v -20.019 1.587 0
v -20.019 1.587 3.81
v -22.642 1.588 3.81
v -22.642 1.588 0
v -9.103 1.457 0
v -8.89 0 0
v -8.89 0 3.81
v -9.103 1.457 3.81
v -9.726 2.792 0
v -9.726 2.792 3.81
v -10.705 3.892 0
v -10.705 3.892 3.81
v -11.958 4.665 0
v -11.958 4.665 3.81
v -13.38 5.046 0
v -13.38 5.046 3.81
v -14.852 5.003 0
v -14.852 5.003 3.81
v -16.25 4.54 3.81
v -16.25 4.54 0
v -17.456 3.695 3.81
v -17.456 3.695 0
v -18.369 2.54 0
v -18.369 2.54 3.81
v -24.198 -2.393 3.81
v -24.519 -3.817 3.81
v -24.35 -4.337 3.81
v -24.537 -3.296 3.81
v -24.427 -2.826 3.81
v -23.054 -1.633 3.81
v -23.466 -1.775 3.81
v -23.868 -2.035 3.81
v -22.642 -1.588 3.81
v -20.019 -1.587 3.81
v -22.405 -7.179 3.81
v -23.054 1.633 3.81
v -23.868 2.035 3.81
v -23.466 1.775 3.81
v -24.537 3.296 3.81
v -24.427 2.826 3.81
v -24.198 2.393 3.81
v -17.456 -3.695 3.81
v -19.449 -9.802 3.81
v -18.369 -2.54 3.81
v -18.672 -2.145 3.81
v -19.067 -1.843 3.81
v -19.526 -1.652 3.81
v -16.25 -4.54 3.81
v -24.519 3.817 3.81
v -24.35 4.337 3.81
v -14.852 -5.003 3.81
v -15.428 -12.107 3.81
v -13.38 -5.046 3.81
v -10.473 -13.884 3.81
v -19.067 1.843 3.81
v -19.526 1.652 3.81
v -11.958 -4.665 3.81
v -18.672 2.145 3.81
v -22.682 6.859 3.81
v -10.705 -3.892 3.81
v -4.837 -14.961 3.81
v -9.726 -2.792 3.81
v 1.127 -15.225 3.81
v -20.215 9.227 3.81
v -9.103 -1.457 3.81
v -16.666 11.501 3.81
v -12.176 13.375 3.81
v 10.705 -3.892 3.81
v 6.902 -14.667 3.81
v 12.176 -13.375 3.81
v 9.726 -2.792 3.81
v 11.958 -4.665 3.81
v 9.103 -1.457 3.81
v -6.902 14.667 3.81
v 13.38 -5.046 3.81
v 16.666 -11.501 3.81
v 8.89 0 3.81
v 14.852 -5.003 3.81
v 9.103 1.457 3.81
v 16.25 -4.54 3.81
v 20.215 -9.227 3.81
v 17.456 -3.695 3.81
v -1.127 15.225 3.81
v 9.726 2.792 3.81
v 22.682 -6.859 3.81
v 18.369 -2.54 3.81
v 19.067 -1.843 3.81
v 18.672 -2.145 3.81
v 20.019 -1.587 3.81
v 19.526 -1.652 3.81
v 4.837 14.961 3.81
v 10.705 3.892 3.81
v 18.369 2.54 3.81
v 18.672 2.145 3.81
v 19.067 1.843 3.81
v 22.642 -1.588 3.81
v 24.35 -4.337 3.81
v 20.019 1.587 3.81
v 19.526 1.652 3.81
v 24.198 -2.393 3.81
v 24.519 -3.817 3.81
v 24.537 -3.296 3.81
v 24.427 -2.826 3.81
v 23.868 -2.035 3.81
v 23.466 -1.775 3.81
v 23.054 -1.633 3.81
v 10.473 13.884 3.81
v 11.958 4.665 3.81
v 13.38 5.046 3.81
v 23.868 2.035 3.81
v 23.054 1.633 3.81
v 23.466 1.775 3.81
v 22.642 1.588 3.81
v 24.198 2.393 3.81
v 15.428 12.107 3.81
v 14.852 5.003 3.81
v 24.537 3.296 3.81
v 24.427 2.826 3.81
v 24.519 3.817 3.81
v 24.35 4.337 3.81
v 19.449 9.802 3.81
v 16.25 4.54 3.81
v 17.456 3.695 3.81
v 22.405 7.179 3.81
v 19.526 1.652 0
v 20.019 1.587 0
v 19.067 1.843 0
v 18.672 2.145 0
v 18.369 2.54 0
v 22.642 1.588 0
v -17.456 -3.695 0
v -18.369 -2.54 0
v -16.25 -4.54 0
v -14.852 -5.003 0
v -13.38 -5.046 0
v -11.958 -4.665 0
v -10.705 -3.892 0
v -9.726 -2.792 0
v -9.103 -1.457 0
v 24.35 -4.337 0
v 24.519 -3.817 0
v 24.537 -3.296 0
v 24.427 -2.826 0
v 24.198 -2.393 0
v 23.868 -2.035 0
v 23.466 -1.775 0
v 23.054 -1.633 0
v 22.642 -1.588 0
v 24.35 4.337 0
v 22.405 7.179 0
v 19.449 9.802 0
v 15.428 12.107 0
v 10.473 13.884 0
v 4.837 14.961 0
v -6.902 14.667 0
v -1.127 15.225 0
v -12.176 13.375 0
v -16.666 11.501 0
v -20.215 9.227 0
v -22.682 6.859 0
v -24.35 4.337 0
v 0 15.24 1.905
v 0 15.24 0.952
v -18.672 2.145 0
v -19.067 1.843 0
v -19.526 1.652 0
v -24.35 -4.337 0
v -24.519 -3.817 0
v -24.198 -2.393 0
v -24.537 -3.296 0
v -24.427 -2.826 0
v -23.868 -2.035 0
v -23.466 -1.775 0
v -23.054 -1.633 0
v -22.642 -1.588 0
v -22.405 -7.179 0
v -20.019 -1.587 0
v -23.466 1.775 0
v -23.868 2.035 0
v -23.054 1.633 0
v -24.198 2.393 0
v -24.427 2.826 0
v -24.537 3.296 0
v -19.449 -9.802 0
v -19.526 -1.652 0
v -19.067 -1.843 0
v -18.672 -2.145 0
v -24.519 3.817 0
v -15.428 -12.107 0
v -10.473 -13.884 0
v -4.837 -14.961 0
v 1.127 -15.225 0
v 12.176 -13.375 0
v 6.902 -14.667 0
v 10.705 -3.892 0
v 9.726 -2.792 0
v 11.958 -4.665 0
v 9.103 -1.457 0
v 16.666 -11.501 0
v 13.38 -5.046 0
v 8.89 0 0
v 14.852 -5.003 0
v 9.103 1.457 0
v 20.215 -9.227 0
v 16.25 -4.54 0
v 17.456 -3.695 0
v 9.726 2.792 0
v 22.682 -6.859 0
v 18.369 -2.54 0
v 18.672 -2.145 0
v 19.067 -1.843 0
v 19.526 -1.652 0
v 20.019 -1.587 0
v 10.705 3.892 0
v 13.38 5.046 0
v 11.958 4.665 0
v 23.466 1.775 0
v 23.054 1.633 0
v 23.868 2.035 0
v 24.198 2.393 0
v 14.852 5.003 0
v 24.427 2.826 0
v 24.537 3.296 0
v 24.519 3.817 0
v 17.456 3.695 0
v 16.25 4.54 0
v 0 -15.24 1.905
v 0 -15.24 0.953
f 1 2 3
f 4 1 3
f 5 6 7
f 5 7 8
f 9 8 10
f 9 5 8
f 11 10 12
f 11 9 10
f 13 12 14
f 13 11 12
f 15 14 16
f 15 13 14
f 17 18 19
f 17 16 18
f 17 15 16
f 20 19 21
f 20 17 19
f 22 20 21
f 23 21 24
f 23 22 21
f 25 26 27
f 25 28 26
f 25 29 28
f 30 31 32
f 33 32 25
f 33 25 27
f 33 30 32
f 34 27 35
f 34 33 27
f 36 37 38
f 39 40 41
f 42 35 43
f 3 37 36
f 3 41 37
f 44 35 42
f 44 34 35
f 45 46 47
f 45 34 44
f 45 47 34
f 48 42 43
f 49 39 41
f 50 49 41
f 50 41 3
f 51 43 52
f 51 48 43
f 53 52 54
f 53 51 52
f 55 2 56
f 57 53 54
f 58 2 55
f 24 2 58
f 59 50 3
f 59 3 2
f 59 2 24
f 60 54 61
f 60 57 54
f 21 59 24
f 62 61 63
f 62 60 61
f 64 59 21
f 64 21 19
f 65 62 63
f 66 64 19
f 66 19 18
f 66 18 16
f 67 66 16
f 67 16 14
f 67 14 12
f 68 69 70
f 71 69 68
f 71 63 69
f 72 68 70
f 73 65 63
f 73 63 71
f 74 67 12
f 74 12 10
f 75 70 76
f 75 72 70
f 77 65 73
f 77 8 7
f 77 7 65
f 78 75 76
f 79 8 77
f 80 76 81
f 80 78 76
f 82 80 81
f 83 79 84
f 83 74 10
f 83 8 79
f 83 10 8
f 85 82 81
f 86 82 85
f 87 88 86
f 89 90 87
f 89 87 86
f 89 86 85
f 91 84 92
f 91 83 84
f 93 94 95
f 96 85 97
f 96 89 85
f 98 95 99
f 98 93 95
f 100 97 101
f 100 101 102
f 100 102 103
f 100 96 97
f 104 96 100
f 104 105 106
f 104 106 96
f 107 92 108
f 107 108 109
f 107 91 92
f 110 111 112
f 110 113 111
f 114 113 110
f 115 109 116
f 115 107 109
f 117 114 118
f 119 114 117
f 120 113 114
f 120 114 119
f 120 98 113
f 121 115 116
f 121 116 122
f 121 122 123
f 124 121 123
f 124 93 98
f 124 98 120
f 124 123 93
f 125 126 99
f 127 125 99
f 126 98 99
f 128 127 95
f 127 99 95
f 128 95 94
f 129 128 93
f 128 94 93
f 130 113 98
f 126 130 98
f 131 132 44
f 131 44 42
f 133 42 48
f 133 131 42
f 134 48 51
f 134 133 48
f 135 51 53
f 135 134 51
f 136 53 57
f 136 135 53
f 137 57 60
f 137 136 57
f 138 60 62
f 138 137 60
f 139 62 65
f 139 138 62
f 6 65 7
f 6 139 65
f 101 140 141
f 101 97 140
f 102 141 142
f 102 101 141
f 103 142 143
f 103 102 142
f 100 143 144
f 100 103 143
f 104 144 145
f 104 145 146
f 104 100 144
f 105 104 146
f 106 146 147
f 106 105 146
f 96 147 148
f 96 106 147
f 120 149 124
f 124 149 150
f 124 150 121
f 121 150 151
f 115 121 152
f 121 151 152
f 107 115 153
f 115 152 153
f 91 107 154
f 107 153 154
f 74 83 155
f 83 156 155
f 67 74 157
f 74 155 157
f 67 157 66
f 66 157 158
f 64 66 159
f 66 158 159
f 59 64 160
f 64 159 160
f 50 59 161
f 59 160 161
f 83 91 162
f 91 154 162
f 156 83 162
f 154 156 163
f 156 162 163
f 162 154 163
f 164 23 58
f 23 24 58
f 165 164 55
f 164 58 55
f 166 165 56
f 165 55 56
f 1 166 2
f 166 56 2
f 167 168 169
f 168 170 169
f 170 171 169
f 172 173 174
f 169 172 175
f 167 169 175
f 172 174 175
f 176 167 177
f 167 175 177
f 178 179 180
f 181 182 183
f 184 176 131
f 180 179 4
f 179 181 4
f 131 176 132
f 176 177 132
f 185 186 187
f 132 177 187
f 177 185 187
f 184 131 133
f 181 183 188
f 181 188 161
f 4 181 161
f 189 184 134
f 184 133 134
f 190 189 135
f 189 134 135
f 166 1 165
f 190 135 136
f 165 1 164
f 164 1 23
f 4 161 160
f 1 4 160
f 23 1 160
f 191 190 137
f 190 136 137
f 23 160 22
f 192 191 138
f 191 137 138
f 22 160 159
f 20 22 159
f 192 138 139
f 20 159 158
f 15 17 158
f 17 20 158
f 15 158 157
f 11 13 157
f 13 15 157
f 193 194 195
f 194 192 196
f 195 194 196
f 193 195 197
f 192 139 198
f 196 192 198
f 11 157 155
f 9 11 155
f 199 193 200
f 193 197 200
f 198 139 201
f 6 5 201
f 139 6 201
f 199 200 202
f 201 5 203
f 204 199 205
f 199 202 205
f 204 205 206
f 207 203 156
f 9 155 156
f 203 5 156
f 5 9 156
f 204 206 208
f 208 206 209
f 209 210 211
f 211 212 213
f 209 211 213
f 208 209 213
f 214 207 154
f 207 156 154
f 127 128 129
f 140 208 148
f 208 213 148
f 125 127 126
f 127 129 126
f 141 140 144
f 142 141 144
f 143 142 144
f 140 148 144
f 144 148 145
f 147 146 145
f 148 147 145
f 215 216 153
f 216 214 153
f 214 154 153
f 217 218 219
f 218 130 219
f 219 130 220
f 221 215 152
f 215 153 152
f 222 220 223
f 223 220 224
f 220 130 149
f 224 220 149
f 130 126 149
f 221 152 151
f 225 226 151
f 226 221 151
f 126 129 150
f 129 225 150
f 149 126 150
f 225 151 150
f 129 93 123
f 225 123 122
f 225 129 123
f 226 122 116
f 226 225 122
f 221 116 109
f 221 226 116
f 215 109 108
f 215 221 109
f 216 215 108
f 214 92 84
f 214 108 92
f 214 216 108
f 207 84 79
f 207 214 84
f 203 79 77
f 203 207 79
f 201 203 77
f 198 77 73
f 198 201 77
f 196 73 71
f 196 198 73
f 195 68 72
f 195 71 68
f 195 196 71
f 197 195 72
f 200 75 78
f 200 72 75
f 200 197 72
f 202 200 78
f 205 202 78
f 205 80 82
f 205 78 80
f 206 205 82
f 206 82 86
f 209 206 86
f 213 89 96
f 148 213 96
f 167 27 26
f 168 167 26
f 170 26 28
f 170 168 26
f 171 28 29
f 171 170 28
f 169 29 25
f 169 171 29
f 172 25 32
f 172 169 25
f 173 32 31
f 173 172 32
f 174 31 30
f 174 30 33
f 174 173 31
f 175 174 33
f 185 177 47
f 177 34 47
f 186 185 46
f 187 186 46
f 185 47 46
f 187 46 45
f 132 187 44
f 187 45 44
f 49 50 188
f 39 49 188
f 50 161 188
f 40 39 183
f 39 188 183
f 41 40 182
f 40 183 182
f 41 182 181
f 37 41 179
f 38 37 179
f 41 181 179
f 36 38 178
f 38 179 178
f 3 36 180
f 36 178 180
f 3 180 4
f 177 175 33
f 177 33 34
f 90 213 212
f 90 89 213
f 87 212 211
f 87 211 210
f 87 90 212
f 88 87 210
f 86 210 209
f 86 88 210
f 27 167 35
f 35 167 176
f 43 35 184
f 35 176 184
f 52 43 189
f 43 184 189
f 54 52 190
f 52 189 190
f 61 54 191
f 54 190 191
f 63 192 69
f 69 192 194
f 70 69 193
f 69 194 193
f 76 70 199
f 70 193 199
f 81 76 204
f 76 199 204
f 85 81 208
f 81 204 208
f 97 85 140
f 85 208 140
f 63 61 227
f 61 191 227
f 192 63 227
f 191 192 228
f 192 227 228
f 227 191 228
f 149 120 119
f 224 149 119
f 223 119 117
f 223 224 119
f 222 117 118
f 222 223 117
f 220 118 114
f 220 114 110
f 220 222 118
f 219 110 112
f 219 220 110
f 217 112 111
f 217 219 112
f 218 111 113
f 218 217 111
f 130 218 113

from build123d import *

# Parameters (mm, degrees)
F1_DEPTH = 3.81
F3_DEPTH = 3.8110001
F4_R     = 1.905
F5_R     = 1.905


with BuildPart() as f1:
    # F0 (on Top) → F1 (new body)
    with BuildSketch(Plane.XY):
        with BuildLine():
            Line((25.4, 0), (-25.4, 0))
            add(Edge.make_bspline(
                [(-25.4, 0), (-25.4, -15.24), (0, -15.24), (25.4, -15.24), (25.4, 0)],
                knots=[0, 0, 0, 1.5707963268, 1.5707963268, 3.1415926536, 3.1415926536, 3.1415926536], degree=2, weights=[1, 0.7071067812, 1, 0.7071067812, 1]))
        make_face()
        with BuildLine():
            add(Edge.make_bspline(
                [(25.4, 0), (25.4, 15.24), (0, 15.24), (-25.4, 15.24), (-25.4, 0)],
                knots=[3.1415926536, 3.1415926536, 3.1415926536, 4.7123889804, 4.7123889804, 6.2831853072, 6.2831853072, 6.2831853072], degree=2, weights=[1, 0.7071067812, 1, 0.7071067812, 1]))
            Line((-25.4, 0), (25.4, 0))
        make_face()
    extrude(amount=F1_DEPTH)

    # F2 (on Top) → F3 (cut, through all)
    with BuildSketch(Plane.XY):
        with BuildLine():
            ThreePointArc((18.7955822188, -1.5875), (18.9859923082, -0.8038788244), (19.05, 0))
            ThreePointArc((19.05, 0), (18.9859923082, 0.8038788244), (18.7955822188, 1.5875))
            ThreePointArc((18.7955822188, 1.5875), (8.89, 0), (18.7955822188, -1.5875))
        make_face()
        with BuildLine():
            ThreePointArc((18.7955822188, 1.5875), (18.9859923082, 0.8038788244), (19.05, 0))
            ThreePointArc((19.05, 0), (18.9859923082, -0.8038788244), (18.7955822188, -1.5875))
            Line((18.7955822188, -1.5875), (25.2618203218, -1.5875))
            ThreePointArc((25.2618203218, -1.5875), (27.3468412814, -0.2786884779), (25.7413380683, 1.5875))
            Line((25.7413380683, 1.5875), (18.7955822188, 1.5875))
        make_face()
        with BuildLine():
            ThreePointArc((-18.7955822188, -1.5875), (-13.1661211756, -5.0159923082), (-8.89, 0))
            ThreePointArc((-8.89, 0), (-13.1661211756, 5.0159923082), (-18.7955822188, 1.5875))
            ThreePointArc((-18.7955822188, 1.5875), (-19.05, 0), (-18.7955822188, -1.5875))
        make_face()
        with BuildLine():
            ThreePointArc((-18.7955822188, -1.5875), (-19.05, 0), (-18.7955822188, 1.5875))
            Line((-18.7955822188, 1.5875), (-24.9277395298, 1.5875))
            ThreePointArc((-24.9277395298, 1.5875), (-26.5152395298, 0), (-24.9277395298, -1.5875))
            Line((-24.9277395298, -1.5875), (-18.7955822188, -1.5875))
        make_face()
    extrude(amount=F3_DEPTH, mode=Mode.SUBTRACT)

    # F4
    f4_edges = [f1.edges().sort_by_distance(p)[0] for p in [
        (25.26182, 1.5875, 1.905),
        (-18.795582, -1.5875, 1.905),
        (-25.268192, 1.550564, 1.905),
        (-25.268192, -1.550564, 1.905),
        (18.795582, 1.5875, 1.905),
        (-18.795582, 1.5875, 1.905),
    ]]
    fillet(f4_edges, radius=F4_R)

    # F5
    f5_edges = [f1.edges().sort_by_distance(p)[0] for p in [
        (25.26182, -1.5875, 1.905),
        (18.795582, -1.5875, 1.905),
    ]]
    fillet(f5_edges, radius=F5_R)


solid = f1.part
